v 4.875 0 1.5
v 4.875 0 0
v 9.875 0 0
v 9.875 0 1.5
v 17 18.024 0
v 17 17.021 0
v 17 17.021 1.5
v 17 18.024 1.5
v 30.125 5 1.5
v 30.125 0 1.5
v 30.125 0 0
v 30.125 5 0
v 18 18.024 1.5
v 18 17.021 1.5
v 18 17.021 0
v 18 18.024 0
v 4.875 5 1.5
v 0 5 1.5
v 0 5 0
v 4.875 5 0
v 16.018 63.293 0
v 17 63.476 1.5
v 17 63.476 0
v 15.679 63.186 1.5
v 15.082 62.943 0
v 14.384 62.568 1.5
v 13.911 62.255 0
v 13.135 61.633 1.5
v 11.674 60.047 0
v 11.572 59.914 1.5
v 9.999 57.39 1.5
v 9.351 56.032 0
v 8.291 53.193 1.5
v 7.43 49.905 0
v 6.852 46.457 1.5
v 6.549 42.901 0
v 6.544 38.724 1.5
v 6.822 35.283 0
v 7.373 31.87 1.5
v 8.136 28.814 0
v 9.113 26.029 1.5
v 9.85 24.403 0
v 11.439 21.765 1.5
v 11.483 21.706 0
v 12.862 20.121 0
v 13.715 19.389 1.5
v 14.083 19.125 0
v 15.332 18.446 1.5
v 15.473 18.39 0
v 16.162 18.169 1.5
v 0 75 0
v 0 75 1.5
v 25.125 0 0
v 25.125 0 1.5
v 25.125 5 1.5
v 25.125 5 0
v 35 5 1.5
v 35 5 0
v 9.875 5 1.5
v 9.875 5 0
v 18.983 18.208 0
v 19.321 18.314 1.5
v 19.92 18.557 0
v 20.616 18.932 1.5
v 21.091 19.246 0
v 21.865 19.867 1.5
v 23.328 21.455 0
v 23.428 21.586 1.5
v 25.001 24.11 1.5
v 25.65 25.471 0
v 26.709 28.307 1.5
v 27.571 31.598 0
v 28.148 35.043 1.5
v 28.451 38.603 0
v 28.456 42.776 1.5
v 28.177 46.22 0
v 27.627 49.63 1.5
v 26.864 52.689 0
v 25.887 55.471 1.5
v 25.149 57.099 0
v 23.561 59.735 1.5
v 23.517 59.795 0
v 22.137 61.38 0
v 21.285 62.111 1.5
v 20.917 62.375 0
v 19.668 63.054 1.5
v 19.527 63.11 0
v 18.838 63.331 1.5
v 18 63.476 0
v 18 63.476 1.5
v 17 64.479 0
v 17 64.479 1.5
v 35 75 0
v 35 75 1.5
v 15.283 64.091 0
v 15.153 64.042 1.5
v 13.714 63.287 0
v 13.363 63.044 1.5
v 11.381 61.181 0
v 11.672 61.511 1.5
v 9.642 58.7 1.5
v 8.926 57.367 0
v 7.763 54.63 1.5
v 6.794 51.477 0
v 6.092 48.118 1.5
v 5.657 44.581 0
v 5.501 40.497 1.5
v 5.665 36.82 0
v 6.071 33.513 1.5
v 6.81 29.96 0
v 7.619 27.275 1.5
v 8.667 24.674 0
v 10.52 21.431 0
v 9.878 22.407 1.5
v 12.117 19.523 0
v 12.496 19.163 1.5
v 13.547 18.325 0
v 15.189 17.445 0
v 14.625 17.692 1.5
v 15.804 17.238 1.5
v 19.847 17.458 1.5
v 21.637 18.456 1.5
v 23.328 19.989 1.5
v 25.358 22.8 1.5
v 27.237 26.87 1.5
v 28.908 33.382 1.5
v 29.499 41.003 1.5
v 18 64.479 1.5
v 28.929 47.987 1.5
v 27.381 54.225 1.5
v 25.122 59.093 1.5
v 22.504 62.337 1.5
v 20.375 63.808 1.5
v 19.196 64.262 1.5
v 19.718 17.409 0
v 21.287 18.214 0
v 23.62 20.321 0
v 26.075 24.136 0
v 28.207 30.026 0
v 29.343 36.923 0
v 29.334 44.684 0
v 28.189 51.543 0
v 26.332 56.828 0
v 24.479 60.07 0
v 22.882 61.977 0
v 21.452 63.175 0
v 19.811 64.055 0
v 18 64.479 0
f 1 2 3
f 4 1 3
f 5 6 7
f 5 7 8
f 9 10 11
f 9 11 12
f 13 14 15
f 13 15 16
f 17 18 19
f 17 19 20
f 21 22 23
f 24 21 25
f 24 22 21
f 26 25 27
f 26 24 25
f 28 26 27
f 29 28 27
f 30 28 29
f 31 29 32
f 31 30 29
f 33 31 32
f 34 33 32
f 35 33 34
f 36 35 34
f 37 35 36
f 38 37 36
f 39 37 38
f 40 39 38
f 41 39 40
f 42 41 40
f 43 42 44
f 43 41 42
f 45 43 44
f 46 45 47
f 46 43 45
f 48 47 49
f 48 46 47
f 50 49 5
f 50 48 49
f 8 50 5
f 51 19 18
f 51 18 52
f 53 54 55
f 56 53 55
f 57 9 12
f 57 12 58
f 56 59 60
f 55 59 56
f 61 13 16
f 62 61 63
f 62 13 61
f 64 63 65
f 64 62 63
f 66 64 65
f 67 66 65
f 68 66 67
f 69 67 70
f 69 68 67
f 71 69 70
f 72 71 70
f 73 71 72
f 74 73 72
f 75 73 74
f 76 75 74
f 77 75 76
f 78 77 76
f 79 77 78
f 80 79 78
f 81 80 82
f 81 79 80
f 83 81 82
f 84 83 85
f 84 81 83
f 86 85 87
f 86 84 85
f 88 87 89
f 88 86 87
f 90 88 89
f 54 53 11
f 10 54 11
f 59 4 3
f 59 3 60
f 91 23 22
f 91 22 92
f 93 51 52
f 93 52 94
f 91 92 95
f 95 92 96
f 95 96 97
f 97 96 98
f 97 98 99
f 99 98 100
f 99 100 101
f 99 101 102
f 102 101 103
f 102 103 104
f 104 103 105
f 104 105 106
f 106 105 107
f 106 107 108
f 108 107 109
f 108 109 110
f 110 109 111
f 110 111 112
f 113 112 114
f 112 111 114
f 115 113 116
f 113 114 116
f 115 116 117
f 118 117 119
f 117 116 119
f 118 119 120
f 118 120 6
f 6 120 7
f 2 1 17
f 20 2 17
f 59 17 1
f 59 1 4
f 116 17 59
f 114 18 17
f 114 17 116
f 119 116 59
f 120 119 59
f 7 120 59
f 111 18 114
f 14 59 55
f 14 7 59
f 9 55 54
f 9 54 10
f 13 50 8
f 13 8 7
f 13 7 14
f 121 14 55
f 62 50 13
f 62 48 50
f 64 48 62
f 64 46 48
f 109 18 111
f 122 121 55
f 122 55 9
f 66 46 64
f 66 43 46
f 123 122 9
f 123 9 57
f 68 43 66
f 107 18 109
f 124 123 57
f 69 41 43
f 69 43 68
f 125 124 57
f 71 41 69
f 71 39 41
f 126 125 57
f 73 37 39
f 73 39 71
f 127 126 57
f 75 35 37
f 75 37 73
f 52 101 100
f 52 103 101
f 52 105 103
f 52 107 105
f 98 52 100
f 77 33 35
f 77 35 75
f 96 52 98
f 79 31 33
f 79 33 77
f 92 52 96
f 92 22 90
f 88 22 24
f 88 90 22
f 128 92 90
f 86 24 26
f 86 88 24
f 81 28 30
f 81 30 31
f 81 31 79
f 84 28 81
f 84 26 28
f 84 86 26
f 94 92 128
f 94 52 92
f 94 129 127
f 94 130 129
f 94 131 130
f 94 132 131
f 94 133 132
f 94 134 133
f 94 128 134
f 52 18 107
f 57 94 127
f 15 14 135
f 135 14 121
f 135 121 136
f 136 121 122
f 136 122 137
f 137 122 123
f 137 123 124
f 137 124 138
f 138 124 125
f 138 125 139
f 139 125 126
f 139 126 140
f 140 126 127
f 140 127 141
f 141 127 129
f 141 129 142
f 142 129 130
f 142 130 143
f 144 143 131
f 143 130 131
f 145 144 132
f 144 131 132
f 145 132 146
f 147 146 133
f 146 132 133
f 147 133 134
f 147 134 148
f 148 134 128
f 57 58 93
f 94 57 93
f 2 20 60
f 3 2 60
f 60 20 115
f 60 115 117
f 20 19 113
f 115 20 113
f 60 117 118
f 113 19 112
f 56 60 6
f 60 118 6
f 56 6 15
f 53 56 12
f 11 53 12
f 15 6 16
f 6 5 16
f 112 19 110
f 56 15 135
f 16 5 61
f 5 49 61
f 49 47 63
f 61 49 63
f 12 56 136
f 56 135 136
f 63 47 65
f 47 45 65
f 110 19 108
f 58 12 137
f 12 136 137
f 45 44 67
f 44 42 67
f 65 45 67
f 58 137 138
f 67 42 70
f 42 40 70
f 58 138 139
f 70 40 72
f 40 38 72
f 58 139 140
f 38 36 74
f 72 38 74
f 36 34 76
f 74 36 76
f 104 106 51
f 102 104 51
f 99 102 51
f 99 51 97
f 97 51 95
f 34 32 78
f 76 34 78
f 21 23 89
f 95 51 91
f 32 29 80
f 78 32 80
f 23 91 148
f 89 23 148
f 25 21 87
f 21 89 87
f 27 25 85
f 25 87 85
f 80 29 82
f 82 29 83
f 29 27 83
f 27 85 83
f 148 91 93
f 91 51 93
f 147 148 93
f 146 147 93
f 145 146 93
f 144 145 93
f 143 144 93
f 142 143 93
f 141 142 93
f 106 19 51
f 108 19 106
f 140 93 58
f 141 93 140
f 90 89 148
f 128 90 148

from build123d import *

# Parameters (mm, degrees)
SKIZZE1_W                        = 35
SKIZZE1_H                        = 75
AUFSATZ_LINEAR_AUSTRAGEN1_DEPTH  = 1.5
SKIZZE3_W                        = 15.25
SKIZZE3_H                        = 5
SKIZZE3_W_2                      = 4.875
SCHNITT_LINEAR_AUSTRAGEN12_DEPTH = 20
SKIZZE4_RX                       = 23.75
SKIZZE4_RY                       = 12
SKIZZE4_RX_2                     = 22.75
SKIZZE4_RY_2                     = 11
SCHNITT_LINEAR_AUSTRAGEN13_DEPTH = 20
SKIZZE6_W                        = 1
SKIZZE6_H                        = 52.800334248
AUFSATZ_LINEAR_AUSTRAGEN4_DEPTH  = 1.5


with BuildPart() as part:
    # Skizze1 → Aufsatz-Linear austragen1 (new body)
    with BuildSketch(Plane.XY):
        with Locations((17.5, 37.5)):
            Rectangle(SKIZZE1_W, SKIZZE1_H)
    extrude(amount=AUFSATZ_LINEAR_AUSTRAGEN1_DEPTH)

    # Skizze3 → Schnitt-Linear austragen12 (cut)
    with BuildSketch(Plane.XY.offset(1.5)):
        with Locations((17.5, 2.5)):
            Rectangle(SKIZZE3_W, SKIZZE3_H)
        with Locations((32.5625, 2.5)):
            Rectangle(SKIZZE3_W_2, SKIZZE3_H)
        with Locations((2.4375, 2.5)):
            Rectangle(SKIZZE3_W_2, SKIZZE3_H)
    extrude(amount=-SCHNITT_LINEAR_AUSTRAGEN12_DEPTH, mode=Mode.SUBTRACT)

    # Skizze4 → Schnitt-Linear austragen13 (cut)
    with BuildSketch(Plane.XY.offset(1.5)):
        with Locations(Location((17.5, 40.75), (0, 0, 90))):
            Ellipse(SKIZZE4_RX, SKIZZE4_RY)
        with Locations(Location((17.5, 40.75), (0, 0, 90))):
            Ellipse(SKIZZE4_RX_2, SKIZZE4_RY_2, mode=Mode.SUBTRACT)
    extrude(amount=-SCHNITT_LINEAR_AUSTRAGEN13_DEPTH, mode=Mode.SUBTRACT)


with BuildPart() as schnitt_linear_austragen13_piece_1:
    # of the separate pieces the step leaves, piece 1, a body of its own (schnitt_linear_austragen13_pieces)
    add(part.part.solids().sort_by_distance((4.875, 0, 0))[0])



with BuildPart() as schnitt_linear_austragen13_piece_2:
    # of the separate pieces the step leaves, piece 2, a body of its own (schnitt_linear_austragen13_pieces)
    add(part.part.solids().sort_by_distance((17.5, 63.5, 0))[0])


with BuildPart() as schnitt_linear_austragen13_piece_1_1:
    add(schnitt_linear_austragen13_piece_1.part)

    add(schnitt_linear_austragen13_piece_2.part)  # Aufsatz-Linear austragen4 merges Schnitt-Linear austragen13 piece 2
    # Skizze6 → Aufsatz-Linear austragen4 (add)
    with BuildSketch(Plane.XY.offset(1.5)):
        with Locations((17.5, 39.413172243)):
            Rectangle(SKIZZE6_W, SKIZZE6_H)
    extrude(amount=-AUFSATZ_LINEAR_AUSTRAGEN4_DEPTH)


solid = schnitt_linear_austragen13_piece_1_1.part
